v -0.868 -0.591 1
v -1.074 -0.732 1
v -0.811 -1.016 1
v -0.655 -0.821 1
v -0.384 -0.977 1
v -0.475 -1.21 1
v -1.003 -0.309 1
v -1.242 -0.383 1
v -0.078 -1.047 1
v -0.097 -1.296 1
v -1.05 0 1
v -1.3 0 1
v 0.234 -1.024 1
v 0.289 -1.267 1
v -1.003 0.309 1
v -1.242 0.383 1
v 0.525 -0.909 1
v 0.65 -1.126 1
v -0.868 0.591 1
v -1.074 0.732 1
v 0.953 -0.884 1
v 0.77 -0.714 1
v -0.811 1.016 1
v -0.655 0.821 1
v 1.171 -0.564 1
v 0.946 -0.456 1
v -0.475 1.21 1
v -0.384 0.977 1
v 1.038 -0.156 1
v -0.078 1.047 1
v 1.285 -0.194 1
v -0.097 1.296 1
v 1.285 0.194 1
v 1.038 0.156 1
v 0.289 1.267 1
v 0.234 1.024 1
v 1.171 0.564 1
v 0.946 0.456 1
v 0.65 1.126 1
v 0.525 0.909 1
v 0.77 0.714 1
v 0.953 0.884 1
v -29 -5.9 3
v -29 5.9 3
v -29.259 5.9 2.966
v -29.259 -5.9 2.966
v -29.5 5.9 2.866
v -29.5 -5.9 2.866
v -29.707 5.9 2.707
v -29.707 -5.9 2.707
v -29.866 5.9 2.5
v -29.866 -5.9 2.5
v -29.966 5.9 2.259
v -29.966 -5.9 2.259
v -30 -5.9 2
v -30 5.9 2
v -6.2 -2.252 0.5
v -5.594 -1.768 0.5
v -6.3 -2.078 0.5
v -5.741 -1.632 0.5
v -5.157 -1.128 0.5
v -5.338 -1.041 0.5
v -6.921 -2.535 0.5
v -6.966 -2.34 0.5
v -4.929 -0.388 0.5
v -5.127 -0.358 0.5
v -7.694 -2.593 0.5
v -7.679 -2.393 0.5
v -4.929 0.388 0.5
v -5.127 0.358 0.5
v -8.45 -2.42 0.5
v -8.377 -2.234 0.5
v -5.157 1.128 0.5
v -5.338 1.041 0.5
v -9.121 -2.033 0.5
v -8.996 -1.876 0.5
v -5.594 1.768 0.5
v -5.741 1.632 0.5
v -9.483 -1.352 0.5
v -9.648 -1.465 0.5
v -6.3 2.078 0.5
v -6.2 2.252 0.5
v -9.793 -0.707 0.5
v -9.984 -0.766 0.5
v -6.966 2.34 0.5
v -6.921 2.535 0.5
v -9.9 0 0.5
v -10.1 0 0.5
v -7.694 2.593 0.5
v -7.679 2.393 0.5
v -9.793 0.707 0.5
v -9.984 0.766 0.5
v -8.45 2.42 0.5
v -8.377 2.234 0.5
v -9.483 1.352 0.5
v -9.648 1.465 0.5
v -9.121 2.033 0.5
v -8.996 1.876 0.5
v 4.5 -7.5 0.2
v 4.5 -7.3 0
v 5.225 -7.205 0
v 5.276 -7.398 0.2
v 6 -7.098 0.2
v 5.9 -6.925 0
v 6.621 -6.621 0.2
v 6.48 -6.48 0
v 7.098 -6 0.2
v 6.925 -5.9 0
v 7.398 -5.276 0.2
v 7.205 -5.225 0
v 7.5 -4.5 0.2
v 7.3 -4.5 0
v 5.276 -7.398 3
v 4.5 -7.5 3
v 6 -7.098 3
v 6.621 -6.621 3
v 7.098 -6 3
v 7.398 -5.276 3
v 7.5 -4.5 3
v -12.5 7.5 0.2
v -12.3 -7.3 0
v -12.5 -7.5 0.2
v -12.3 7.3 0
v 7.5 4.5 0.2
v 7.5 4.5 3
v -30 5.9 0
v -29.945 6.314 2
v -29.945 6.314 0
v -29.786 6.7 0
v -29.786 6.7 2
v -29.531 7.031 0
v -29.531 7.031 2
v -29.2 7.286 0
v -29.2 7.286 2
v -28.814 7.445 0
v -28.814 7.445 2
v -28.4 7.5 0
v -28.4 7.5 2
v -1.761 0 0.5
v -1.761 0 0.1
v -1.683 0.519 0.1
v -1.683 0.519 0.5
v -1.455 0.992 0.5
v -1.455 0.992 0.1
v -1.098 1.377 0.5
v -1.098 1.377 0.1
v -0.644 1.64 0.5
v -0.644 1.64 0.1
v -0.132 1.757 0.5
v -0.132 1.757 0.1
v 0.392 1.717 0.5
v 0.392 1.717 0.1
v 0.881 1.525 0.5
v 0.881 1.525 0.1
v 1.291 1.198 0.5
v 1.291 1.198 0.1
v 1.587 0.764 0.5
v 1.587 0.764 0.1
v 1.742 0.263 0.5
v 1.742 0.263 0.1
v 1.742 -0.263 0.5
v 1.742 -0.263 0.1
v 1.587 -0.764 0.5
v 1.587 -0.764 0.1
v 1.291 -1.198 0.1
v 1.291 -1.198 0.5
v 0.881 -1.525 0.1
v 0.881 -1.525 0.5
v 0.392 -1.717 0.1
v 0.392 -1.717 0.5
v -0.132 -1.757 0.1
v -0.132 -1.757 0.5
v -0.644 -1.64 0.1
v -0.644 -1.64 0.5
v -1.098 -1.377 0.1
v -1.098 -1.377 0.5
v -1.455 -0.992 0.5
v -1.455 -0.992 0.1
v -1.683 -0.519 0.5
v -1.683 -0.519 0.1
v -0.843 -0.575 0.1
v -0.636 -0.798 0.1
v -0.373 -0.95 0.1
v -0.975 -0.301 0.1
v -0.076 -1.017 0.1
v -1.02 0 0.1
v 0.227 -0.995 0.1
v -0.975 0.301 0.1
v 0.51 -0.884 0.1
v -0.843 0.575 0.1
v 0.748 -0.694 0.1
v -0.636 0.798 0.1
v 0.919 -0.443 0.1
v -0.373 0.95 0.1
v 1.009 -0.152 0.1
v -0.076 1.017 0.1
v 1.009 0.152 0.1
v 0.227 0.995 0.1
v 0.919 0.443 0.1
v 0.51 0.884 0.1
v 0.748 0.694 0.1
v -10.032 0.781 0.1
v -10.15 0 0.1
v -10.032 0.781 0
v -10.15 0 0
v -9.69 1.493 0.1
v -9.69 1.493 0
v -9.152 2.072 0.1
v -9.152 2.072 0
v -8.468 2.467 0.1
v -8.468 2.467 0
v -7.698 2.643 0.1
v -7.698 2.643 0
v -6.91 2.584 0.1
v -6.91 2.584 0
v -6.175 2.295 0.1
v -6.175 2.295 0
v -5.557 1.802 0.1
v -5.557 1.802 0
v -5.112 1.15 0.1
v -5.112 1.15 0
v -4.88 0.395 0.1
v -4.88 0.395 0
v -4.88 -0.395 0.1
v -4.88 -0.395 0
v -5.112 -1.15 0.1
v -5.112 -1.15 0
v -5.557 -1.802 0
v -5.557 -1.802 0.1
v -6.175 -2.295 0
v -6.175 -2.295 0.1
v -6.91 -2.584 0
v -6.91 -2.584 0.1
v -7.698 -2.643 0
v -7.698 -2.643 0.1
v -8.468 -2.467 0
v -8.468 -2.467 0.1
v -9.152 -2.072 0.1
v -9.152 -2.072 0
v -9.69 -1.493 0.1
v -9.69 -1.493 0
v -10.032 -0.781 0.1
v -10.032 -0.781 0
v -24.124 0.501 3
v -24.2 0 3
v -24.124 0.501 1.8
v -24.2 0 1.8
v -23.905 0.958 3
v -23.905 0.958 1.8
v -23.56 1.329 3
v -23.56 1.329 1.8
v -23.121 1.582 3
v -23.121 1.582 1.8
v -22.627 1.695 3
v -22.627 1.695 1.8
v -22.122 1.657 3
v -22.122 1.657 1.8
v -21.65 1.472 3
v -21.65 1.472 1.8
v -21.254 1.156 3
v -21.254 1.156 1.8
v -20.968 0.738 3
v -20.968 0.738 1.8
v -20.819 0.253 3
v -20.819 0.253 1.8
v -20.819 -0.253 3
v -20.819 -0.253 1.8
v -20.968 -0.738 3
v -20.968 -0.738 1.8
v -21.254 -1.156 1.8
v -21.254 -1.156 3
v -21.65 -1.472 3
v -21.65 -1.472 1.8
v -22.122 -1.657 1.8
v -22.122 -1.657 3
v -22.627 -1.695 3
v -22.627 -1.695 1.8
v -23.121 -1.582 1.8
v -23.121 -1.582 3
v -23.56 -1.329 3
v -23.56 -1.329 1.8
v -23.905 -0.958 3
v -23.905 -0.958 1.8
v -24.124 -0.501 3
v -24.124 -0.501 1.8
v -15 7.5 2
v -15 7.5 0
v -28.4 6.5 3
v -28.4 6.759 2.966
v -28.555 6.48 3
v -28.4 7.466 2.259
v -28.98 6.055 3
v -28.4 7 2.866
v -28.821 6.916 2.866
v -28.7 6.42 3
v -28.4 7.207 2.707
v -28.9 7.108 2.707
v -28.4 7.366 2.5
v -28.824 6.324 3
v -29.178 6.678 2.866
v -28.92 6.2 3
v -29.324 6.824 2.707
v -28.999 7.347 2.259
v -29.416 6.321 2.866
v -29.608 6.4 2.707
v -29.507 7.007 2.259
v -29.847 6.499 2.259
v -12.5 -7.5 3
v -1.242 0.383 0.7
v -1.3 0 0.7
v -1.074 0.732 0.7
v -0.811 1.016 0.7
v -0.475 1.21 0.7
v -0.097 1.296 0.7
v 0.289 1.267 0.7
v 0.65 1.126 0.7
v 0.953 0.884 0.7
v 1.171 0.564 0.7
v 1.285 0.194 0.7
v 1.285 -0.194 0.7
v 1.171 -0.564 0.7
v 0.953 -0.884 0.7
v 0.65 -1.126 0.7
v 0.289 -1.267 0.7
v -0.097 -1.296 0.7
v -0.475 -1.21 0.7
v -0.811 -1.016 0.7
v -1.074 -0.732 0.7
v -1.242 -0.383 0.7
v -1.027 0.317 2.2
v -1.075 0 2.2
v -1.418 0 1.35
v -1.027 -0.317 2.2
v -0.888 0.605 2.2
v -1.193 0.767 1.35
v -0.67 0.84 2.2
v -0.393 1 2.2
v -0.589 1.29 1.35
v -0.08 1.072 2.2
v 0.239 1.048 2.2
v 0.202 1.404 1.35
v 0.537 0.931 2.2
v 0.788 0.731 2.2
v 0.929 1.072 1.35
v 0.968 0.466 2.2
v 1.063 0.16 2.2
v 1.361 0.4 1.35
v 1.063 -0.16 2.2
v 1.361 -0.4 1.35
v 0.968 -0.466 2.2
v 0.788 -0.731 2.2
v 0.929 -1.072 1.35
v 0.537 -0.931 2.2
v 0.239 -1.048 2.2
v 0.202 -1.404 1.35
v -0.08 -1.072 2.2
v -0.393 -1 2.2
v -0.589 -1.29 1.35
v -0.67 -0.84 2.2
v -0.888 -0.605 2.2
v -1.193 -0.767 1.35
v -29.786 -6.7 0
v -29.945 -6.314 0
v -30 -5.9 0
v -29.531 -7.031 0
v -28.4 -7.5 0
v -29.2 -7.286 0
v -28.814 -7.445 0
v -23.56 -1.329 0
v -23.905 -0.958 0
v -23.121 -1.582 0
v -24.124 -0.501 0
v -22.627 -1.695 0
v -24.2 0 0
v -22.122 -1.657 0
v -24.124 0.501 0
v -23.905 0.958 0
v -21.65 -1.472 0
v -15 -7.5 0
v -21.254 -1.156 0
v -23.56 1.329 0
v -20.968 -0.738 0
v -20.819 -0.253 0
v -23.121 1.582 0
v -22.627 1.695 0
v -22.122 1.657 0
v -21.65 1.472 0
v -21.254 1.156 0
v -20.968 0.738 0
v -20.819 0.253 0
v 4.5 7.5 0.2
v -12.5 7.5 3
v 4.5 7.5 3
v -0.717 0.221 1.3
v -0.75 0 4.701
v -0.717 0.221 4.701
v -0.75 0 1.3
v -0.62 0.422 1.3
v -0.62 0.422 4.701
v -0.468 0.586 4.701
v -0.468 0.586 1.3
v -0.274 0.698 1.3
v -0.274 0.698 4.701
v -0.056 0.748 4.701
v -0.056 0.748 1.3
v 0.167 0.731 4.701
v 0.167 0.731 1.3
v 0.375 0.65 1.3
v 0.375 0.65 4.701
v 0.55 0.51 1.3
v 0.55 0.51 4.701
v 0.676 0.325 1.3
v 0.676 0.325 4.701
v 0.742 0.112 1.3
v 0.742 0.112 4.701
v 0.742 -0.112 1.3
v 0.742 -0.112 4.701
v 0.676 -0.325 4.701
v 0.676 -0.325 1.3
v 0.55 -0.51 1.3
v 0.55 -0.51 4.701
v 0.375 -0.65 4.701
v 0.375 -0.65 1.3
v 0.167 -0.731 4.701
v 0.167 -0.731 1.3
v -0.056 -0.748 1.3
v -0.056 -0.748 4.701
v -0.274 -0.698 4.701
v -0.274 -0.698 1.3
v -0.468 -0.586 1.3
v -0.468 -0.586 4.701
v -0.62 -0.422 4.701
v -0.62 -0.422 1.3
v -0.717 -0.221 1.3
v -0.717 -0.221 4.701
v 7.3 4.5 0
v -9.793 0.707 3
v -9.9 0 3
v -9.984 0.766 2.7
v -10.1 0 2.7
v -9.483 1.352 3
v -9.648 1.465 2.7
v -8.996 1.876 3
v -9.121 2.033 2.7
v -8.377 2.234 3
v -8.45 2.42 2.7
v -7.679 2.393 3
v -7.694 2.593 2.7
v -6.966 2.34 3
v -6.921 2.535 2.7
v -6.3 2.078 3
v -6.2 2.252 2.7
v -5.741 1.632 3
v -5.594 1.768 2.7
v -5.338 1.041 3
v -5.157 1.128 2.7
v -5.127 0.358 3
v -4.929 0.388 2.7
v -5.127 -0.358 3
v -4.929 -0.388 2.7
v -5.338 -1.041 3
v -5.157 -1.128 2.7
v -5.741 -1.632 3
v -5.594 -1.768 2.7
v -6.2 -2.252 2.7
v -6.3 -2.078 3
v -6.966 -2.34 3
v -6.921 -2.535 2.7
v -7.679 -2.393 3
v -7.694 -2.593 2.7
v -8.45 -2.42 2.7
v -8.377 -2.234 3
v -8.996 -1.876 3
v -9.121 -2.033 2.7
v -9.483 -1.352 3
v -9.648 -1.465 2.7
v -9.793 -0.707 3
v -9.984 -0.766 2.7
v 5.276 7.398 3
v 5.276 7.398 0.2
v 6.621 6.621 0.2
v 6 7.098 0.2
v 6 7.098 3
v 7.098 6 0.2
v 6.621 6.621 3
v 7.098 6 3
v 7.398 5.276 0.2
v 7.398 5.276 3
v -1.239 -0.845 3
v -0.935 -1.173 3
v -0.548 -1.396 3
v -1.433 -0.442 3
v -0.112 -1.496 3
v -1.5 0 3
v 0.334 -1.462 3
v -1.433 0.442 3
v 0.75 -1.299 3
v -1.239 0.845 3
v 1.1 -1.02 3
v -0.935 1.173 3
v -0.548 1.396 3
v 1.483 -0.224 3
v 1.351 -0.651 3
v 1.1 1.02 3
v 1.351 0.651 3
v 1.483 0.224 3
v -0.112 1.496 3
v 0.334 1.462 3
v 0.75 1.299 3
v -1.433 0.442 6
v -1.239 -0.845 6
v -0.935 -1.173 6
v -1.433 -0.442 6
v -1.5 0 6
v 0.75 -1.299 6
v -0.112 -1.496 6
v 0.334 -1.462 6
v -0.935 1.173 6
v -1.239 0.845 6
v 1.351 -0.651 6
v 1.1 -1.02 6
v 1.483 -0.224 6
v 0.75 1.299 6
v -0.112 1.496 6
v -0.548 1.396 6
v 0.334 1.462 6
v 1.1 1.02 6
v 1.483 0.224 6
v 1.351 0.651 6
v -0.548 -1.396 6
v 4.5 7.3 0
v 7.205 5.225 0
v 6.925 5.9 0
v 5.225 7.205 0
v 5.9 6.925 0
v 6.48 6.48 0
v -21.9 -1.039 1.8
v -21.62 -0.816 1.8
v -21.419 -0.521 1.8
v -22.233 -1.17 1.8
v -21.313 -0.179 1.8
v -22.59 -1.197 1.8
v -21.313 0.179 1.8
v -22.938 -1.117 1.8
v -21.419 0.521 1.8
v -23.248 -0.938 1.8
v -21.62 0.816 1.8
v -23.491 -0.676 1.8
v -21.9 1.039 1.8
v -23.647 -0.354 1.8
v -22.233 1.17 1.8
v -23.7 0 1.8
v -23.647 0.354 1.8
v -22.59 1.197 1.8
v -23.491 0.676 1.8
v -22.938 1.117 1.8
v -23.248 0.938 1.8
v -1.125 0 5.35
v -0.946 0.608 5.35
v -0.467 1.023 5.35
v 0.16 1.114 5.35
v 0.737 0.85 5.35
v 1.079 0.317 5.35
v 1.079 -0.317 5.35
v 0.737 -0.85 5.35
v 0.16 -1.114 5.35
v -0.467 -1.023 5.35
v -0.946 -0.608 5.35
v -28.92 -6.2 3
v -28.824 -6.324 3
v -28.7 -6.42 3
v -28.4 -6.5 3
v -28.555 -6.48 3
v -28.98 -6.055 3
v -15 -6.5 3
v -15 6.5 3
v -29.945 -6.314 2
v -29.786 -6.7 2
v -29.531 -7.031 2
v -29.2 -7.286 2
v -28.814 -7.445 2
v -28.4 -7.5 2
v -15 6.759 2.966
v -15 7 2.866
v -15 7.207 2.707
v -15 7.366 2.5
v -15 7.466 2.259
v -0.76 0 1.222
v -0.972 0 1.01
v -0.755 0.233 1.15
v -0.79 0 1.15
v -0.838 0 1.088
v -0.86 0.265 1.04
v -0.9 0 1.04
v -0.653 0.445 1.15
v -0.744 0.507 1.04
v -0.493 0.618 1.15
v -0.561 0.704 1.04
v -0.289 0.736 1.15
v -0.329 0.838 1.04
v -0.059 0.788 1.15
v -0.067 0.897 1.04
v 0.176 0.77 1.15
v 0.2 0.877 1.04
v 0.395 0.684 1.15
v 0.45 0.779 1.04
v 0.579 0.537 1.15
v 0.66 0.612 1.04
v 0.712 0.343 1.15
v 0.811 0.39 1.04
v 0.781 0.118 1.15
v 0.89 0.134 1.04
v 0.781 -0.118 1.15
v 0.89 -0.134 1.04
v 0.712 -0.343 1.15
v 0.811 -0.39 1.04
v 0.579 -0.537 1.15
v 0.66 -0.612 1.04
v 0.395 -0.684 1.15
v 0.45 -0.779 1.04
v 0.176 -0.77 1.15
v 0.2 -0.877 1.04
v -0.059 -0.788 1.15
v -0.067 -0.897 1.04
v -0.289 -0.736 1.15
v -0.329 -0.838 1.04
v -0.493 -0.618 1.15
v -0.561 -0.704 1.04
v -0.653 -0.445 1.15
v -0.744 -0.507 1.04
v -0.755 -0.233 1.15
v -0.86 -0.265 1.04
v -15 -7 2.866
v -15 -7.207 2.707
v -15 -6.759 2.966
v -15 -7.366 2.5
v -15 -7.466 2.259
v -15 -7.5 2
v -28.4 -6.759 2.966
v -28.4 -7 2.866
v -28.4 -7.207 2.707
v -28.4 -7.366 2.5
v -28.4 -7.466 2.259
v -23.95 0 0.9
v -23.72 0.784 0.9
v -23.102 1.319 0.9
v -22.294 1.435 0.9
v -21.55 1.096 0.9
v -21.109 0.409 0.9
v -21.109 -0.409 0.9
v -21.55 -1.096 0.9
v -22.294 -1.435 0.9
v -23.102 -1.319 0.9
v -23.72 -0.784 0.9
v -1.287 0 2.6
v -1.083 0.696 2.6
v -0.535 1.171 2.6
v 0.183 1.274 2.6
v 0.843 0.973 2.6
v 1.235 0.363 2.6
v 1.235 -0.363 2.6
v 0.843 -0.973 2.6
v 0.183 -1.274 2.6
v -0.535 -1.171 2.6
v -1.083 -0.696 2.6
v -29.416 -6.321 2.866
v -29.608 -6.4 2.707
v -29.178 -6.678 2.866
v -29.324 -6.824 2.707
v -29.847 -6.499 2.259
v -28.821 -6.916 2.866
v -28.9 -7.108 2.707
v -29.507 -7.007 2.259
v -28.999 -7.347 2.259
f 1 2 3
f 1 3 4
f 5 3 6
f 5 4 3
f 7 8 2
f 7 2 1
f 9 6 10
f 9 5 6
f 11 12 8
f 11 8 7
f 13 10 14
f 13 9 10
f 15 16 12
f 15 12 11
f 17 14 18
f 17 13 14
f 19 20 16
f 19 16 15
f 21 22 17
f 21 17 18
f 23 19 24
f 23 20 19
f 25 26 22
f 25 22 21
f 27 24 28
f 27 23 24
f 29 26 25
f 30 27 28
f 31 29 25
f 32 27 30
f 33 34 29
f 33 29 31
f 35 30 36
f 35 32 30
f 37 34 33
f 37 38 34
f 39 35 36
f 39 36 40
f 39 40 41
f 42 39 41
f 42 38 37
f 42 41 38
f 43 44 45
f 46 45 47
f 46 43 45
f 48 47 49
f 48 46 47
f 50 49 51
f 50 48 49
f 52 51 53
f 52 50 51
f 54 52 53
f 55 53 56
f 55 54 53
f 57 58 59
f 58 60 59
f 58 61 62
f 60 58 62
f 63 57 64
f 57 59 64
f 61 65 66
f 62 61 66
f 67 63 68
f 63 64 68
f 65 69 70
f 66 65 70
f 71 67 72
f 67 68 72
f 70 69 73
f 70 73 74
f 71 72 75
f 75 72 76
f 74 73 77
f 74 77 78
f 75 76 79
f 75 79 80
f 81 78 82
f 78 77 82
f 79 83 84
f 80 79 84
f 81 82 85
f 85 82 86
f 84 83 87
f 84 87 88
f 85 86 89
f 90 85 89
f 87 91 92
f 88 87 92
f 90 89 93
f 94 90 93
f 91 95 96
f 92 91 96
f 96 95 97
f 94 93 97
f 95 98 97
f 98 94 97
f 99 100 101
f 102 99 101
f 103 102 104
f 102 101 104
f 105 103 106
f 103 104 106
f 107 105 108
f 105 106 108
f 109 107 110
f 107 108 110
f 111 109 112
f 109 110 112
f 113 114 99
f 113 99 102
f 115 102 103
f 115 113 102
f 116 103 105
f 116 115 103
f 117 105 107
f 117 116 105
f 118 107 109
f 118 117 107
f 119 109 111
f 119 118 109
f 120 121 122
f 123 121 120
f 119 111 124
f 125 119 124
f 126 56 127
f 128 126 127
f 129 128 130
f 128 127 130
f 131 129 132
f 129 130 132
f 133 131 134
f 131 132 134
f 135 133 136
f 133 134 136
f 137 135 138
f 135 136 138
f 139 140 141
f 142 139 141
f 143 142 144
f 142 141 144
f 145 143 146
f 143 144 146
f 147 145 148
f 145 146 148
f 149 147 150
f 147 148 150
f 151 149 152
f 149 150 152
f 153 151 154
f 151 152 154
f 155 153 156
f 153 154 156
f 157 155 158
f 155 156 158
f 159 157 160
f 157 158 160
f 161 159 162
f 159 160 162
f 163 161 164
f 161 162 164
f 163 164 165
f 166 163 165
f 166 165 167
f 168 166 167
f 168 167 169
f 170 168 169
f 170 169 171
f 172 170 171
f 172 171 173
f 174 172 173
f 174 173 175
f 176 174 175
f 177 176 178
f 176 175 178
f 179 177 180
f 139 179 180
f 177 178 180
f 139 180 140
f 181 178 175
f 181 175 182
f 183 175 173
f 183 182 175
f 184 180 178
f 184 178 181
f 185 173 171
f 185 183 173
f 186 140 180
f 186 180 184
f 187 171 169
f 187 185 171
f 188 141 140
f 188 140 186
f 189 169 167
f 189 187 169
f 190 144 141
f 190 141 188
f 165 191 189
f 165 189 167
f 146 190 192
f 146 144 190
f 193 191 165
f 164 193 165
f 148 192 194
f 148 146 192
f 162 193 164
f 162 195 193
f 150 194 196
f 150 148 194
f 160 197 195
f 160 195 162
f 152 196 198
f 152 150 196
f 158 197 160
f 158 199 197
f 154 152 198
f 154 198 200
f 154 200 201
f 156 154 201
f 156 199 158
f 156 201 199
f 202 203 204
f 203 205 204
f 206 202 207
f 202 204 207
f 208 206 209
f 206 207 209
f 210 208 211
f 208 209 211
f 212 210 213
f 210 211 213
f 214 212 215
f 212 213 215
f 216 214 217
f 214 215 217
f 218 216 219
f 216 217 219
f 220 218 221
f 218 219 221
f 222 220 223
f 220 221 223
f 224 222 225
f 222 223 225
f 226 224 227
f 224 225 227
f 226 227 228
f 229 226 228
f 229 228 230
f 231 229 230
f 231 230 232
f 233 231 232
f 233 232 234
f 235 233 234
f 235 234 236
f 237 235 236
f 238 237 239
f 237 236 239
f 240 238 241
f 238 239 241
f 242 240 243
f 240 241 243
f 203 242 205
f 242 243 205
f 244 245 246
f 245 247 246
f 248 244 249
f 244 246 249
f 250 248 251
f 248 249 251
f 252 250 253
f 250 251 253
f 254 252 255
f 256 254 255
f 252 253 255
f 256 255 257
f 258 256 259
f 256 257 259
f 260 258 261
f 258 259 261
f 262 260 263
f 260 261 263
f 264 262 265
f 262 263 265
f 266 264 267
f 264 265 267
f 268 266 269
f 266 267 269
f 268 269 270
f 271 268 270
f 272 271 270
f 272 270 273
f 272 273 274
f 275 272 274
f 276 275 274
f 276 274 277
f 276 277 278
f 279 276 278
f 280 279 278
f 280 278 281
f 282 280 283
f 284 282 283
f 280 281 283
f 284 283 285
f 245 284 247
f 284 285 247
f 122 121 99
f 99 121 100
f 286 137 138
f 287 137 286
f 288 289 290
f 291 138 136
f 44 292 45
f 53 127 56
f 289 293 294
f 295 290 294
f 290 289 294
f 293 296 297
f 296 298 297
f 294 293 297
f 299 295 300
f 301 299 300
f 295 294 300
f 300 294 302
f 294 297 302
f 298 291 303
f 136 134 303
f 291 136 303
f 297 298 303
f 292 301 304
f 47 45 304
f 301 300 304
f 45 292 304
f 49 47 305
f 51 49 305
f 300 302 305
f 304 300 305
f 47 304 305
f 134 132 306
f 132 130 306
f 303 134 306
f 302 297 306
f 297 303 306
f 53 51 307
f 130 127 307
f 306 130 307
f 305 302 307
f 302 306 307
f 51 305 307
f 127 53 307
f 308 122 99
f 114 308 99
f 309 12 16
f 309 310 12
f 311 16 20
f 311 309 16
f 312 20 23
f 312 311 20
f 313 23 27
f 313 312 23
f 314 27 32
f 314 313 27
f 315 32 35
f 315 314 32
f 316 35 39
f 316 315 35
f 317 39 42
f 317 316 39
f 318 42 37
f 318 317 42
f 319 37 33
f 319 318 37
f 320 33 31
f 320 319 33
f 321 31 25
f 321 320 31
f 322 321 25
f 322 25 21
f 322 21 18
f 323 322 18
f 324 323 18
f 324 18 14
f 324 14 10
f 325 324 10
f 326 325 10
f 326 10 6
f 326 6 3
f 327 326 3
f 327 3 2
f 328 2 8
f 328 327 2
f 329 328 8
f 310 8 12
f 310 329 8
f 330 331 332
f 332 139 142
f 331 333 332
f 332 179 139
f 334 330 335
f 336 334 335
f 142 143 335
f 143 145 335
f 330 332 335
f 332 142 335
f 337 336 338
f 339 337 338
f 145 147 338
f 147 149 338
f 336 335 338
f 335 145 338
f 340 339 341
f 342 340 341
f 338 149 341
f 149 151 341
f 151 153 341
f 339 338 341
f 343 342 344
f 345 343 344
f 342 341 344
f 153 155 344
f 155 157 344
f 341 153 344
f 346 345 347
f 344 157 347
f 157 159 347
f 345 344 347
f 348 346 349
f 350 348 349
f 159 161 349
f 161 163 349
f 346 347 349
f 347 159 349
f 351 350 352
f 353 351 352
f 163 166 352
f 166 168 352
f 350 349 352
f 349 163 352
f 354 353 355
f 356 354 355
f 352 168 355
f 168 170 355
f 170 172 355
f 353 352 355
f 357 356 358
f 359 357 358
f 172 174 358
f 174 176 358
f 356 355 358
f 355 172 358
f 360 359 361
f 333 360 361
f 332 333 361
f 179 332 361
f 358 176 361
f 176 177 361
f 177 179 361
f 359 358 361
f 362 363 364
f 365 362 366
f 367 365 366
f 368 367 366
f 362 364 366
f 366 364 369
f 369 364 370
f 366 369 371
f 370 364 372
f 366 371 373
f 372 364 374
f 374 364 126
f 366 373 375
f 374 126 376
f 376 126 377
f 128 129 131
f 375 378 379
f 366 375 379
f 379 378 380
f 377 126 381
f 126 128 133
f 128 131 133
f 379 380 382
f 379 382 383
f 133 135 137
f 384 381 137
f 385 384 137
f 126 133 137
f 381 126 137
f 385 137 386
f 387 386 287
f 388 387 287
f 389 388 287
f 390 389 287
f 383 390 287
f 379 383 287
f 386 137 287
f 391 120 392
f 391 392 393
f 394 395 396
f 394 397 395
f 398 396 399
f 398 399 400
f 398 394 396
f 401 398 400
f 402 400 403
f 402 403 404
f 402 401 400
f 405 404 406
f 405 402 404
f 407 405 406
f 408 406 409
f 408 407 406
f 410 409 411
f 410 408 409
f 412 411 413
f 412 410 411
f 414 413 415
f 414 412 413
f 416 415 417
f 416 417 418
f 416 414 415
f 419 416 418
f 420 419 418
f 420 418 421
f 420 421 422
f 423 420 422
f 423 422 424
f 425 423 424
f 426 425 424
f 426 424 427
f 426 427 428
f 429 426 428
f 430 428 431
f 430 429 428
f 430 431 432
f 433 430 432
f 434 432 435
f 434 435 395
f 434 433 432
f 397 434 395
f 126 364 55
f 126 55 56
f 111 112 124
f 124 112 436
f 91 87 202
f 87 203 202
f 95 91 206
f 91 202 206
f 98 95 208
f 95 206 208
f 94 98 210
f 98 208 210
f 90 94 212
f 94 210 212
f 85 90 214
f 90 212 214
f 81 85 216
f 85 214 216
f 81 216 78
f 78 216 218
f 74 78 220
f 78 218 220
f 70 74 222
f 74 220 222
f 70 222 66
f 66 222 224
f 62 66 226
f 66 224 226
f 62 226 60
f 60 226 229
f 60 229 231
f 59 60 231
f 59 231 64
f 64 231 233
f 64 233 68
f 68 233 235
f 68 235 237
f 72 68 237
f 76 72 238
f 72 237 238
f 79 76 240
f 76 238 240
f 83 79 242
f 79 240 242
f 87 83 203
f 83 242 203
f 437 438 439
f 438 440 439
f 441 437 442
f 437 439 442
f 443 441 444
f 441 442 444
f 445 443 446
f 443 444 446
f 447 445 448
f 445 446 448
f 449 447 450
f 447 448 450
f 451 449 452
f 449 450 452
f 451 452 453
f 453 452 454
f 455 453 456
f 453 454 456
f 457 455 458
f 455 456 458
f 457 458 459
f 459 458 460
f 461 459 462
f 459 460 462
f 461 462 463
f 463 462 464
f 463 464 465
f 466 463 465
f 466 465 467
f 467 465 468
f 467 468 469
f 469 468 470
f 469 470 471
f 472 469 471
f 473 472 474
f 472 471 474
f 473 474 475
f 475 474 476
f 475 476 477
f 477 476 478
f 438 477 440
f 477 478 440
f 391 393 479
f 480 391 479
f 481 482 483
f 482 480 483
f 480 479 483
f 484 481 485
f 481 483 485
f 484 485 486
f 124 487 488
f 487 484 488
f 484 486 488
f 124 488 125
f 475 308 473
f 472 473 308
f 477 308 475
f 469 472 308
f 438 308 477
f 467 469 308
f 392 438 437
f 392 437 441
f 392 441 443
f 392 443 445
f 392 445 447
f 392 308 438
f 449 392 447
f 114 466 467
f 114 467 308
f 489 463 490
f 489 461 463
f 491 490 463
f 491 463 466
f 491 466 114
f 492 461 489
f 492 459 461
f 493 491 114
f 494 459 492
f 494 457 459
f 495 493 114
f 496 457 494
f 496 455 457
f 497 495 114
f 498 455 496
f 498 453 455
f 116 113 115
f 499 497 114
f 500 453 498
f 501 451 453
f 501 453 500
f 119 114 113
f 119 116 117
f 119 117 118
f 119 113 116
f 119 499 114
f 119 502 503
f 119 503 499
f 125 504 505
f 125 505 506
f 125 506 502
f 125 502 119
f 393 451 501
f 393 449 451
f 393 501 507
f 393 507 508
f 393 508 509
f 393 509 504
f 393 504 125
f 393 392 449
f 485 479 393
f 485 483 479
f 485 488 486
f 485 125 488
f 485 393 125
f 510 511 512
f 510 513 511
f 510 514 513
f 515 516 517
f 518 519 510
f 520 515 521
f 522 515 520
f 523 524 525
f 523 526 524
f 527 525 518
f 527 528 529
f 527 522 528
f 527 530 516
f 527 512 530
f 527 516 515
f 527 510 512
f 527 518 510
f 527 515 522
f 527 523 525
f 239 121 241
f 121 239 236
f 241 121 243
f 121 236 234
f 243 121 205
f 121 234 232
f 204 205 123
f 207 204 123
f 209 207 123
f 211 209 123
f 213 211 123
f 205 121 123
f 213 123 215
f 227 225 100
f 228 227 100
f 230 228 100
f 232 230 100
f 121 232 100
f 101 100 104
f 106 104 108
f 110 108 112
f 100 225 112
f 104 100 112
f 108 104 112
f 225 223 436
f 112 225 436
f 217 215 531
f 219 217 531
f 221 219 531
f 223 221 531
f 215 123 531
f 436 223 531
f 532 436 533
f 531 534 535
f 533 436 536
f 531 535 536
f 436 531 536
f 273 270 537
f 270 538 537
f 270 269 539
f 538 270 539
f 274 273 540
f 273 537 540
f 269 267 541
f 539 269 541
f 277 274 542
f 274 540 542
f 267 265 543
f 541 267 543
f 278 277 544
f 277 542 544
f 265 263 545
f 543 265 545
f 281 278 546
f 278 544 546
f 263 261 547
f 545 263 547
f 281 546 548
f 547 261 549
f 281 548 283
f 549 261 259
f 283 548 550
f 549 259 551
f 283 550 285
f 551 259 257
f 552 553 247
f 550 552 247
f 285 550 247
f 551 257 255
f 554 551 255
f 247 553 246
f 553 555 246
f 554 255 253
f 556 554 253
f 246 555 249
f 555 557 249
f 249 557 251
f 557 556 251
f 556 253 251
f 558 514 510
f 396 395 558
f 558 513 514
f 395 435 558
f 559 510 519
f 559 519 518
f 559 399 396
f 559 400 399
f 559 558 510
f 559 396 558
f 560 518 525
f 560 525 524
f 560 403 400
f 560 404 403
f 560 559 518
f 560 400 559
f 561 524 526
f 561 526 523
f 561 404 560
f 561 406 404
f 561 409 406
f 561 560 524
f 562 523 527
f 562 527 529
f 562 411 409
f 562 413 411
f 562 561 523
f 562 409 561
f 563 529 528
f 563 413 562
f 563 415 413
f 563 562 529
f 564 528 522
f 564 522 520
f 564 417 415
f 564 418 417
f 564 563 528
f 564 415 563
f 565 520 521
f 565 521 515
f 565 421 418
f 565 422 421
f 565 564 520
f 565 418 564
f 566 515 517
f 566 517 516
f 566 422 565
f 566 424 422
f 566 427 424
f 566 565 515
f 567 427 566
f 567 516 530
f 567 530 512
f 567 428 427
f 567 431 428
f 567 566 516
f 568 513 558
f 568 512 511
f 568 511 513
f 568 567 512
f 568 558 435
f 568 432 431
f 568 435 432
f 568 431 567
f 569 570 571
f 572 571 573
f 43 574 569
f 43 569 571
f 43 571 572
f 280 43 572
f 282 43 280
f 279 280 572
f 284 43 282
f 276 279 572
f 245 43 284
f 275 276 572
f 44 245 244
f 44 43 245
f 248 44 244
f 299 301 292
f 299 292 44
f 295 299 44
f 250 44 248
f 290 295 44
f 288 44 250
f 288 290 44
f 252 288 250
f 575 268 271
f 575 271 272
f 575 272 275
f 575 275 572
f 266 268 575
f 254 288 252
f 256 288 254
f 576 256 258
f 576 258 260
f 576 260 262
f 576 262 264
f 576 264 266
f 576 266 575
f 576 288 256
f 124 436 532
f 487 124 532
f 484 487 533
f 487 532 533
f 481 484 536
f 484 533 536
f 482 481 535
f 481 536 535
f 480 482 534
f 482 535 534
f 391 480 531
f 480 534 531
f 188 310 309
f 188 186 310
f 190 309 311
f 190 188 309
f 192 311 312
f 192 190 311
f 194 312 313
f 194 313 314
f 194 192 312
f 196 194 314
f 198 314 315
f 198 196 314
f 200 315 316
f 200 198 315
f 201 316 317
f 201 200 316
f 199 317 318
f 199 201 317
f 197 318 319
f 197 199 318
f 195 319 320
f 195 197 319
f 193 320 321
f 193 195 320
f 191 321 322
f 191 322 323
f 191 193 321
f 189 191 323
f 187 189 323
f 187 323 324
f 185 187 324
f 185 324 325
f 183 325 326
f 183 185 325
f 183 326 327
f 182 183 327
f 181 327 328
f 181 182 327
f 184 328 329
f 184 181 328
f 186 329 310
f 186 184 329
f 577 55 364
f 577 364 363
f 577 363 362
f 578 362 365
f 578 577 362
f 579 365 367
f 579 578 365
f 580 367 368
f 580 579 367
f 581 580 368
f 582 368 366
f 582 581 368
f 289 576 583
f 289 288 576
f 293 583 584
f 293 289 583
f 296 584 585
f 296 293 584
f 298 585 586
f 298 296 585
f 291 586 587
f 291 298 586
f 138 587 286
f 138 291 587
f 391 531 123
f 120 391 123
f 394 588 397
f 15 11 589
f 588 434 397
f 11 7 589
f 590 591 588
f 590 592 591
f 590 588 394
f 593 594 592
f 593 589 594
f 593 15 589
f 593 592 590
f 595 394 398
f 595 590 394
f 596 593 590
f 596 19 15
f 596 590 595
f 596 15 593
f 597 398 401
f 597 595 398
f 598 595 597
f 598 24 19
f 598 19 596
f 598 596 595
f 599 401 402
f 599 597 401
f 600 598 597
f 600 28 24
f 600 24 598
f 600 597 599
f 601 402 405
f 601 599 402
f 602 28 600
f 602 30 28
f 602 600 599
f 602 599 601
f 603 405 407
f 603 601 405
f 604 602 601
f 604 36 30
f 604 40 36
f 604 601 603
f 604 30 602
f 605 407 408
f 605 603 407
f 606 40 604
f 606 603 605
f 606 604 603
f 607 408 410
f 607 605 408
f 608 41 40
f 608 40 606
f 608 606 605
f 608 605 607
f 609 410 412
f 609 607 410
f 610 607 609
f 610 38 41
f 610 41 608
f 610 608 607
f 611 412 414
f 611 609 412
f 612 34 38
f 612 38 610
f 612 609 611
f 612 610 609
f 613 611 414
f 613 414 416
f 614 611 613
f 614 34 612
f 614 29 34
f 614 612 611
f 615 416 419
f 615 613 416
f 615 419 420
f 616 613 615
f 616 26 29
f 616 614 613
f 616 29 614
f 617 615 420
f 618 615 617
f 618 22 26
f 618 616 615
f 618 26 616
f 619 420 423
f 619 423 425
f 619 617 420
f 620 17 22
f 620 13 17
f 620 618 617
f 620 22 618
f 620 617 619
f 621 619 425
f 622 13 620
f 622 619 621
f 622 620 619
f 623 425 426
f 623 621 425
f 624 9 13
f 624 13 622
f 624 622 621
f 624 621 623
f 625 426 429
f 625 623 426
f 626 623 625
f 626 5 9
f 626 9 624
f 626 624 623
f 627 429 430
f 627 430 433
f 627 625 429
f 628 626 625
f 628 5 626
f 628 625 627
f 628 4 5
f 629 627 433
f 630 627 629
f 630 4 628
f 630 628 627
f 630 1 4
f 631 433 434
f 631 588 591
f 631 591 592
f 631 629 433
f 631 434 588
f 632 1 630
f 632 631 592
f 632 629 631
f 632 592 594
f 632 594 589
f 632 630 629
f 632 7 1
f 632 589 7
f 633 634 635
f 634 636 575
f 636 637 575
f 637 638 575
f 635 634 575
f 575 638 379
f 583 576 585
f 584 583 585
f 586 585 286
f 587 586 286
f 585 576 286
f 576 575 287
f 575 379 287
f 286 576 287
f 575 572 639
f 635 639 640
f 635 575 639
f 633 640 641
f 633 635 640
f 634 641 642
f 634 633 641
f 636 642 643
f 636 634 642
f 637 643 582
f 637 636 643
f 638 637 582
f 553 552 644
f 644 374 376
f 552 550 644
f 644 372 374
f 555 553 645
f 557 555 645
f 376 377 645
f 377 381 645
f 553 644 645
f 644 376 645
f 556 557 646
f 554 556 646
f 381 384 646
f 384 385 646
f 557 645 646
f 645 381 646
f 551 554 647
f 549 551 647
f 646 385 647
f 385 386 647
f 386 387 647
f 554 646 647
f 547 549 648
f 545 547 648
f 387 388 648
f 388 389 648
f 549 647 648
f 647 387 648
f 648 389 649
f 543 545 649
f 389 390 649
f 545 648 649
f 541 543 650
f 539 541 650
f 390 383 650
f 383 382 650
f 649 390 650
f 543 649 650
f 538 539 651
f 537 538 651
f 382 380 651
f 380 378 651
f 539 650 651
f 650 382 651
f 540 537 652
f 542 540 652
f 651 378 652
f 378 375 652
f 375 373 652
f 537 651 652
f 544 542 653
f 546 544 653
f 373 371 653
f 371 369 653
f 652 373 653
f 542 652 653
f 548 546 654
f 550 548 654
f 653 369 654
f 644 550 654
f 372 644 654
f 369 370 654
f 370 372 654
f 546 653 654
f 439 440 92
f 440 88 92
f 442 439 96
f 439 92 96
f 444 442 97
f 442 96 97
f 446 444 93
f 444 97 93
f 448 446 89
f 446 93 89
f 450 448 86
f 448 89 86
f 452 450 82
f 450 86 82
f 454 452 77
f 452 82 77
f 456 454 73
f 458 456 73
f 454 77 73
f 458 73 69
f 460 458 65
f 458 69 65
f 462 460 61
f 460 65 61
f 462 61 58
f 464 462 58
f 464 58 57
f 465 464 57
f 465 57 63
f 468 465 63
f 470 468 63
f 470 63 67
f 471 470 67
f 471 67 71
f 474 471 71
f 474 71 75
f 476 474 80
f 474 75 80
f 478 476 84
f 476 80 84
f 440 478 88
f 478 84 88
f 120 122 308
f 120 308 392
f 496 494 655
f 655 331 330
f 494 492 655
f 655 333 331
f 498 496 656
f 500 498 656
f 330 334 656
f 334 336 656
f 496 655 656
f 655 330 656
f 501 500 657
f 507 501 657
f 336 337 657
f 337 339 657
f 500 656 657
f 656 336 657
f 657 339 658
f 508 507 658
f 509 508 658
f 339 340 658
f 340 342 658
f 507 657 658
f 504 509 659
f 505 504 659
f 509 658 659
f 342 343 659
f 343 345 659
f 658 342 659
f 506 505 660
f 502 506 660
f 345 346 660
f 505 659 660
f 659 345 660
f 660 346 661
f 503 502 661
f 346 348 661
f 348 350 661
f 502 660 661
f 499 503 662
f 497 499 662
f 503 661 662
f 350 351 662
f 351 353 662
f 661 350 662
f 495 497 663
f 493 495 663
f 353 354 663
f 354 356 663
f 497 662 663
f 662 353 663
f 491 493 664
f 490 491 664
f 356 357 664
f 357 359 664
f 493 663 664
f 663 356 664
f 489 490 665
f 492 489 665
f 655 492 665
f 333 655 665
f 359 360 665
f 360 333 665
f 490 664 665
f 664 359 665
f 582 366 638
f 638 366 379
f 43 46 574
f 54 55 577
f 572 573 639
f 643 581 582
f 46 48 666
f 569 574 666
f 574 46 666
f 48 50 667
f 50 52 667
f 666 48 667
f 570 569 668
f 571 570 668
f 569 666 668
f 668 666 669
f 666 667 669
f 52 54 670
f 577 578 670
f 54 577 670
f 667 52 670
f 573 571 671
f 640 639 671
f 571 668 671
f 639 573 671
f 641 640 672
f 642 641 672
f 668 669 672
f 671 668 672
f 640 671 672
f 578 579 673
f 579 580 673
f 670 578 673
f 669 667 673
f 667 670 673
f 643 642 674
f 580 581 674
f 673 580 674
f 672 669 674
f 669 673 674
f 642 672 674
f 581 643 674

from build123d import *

# Parameters (mm, degrees)
F0_W     = 20
F0_H     = 15
F1_DEPTH = 3
F6_W     = 15
F6_H     = 15
F7_DEPTH = 3
F10_R    = 3
F11_SIZE = 0.2
F12_R    = 1.6
F13_R    = 1


with BuildPart() as f1:
    # F0 (on Top) → F1 (new body)
    with BuildSketch(Plane.XY):
        with Locations((-2.5, 0)):
            Rectangle(F0_W, F0_H)
    extrude(amount=F1_DEPTH)

    # F2 (on Front) → F3 (revolve, cut)
    with BuildSketch(Plane.XZ):
        Polygon((-1.761477, 0.5), (-1.761477, 0), (0, 0), (0, 3), (-1.5, 3), (-1.074632, 2.2), align=None)
    revolve(axis=Axis((0, 0, 1.600896), (0, 0, -1)), mode=Mode.SUBTRACT)

    # F4 (on Front) → F5 (revolve)
    with BuildSketch(Plane.XZ):
        with BuildLine():
            Line((0, 0), (0, 6))
            Line((0, 6), (-1.5, 6))
            Line((-1.5, 6), (-0.75, 4.700962))
            Line((-0.75, 4.700962), (-0.75, 1.3))
            ThreePointArc((-0.75, 1.3), (-0.837868, 1.087868), (-1.05, 1))
            Line((-1.05, 1), (-1.3, 1))
            Line((-1.3, 1), (-1.3, 0.7))
            Line((-1.3, 0.7), (-1.020215, 0.1))
            Line((-1.020215, 0.1), (-2.5, 0.1))
            Line((-2.5, 0.1), (-2.5, 0))
            Line((-2.5, 0), (0, 0))
        make_face()
    revolve(axis=Axis((0, 0, 3.129984), (0, 0, -1)))

    # F10
    f10_edges = [f1.edges().sort_by_distance(p)[0] for p in [
        (7.5, -7.5, 1.5),
        (7.5, 7.5, 1.5),
    ]]
    fillet(f10_edges, radius=F10_R)

    # F11
    f11_edges = [f1.edges().sort_by_distance(p)[0] for p in [
        (7.5, 0, 0),
        (-4, -7.5, 0),
        (-12.5, 0, 0),
        (-4, 7.5, 0),
    ]]
    chamfer(f11_edges, length=F11_SIZE)

    # F14 (on Front) → F15 (revolve, cut)
    with BuildSketch(Plane.XZ):
        Polygon((-10.1, 2.7), (-10.1, 0.5), (-9.9, 0.5), (-10.15, 0.1), (-10.15, 0), (-7.5, 0), (-7.5, 3), (-9.9, 3), align=None)
    revolve(axis=Axis((-7.5, 0, 0.24304), (0, 0, -1)), mode=Mode.SUBTRACT)


with BuildPart() as f7:
    # F6 (on Top) → F7 (new body)
    with BuildSketch(Plane.XY):
        with Locations((-22.5, 0)):
            Rectangle(F6_W, F6_H)
    extrude(amount=F7_DEPTH)

    # F8 (on Front) → F9 (revolve, cut)
    with BuildSketch(Plane.XZ):
        Polygon((-22.5, 0), (-22.5, 3), (-24.2, 3), (-24.2, 1.8), (-23.7, 1.8), (-24.2, 0), align=None)
    revolve(axis=Axis((-22.5, 0, 0.614696), (0, 0, -1)), mode=Mode.SUBTRACT)

    # F12
    f12_edges = [f7.edges().sort_by_distance(p)[0] for p in [
        (-30, -7.5, 1.5),
        (-30, 7.5, 1.5),
    ]]
    fillet(f12_edges, radius=F12_R)

    # F13
    f13_edges = [f7.edges().sort_by_distance(p)[0] for p in [
        (-21.7, -7.5, 3),
    ]]
    fillet(f13_edges, radius=F13_R)


solid = Compound([f1.part, f7.part])
